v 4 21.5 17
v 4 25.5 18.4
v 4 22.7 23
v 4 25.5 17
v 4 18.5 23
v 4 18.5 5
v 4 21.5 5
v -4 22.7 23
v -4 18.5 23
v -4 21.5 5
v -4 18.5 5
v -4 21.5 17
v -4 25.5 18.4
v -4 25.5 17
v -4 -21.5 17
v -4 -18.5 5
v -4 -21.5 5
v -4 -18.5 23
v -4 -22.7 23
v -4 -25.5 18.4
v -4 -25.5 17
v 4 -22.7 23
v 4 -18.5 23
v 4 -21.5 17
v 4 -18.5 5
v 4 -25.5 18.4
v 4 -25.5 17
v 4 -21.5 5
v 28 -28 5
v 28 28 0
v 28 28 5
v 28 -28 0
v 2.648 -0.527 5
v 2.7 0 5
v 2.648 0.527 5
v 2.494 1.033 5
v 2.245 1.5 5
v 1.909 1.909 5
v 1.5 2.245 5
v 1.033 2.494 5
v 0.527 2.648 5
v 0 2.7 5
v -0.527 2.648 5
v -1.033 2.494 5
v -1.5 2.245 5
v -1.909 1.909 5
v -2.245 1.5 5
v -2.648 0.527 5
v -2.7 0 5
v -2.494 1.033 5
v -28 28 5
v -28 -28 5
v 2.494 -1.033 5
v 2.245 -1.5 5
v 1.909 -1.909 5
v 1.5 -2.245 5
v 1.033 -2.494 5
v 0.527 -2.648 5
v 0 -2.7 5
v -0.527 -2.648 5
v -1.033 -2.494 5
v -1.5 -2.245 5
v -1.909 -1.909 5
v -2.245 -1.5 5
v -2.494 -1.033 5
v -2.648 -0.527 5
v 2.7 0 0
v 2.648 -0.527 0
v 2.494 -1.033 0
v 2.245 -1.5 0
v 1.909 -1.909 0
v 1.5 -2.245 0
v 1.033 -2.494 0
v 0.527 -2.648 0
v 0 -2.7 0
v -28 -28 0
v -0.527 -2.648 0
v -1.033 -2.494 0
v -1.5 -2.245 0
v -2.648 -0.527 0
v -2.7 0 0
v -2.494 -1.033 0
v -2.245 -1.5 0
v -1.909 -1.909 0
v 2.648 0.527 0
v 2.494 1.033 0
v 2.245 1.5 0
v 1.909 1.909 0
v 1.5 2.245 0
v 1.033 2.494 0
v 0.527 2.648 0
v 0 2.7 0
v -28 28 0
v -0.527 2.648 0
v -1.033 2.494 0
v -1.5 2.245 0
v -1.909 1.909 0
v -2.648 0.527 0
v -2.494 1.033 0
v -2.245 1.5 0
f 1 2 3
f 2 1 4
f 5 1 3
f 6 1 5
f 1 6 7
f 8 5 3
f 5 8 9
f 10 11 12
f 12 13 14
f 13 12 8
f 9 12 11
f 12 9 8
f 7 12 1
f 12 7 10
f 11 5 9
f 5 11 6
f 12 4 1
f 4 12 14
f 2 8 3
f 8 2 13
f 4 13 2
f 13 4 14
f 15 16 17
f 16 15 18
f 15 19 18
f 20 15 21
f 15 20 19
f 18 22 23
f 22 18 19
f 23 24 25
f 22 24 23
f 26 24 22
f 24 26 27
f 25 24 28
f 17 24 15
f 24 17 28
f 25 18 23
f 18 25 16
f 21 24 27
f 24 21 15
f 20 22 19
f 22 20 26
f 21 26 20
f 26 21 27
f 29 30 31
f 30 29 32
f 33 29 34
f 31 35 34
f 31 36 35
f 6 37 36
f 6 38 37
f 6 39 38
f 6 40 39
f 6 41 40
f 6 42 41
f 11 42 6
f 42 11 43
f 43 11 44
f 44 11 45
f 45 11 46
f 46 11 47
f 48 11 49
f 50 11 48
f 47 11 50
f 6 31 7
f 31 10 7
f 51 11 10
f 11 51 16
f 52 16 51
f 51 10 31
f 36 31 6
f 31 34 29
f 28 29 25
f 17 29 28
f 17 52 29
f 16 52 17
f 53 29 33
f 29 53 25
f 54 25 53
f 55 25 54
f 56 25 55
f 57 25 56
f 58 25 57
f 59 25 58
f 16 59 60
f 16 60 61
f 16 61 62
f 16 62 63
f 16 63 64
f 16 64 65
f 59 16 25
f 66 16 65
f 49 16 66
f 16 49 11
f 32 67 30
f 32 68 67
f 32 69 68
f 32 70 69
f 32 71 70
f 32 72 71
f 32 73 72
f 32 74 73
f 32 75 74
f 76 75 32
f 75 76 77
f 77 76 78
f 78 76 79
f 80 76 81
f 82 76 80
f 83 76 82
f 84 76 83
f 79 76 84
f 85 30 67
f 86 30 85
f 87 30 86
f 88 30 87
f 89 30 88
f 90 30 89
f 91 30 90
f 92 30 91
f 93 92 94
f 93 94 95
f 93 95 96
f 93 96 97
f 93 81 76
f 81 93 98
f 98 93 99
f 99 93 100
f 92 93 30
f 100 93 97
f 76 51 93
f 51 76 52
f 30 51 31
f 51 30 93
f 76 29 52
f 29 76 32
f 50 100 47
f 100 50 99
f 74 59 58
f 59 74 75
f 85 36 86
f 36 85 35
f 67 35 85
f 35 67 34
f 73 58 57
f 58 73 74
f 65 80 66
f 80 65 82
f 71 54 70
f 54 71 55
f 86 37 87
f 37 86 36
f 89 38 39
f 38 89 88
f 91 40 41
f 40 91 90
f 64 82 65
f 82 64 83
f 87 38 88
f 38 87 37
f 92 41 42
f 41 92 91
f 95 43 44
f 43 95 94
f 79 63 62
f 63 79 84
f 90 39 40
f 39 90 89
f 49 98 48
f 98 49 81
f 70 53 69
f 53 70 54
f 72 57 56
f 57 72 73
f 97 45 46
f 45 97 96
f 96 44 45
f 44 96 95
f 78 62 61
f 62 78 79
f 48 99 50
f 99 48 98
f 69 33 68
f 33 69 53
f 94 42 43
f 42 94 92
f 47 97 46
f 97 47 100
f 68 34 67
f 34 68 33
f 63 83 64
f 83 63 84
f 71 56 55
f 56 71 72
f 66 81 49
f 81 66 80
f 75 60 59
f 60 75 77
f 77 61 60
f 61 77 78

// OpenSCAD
$fn = 32;

// ----------------------------------------------------------------------
// Snap-fit latch: 2 arms, 18 mm tall, 4.2 mm undercut hooks
// ----------------------------------------------------------------------

// --- parameters (mm) ---
base_d = 56;              // base plate depth
base_h = 5;               // base plate thickness
span = 40;                // distance between opposite arms
arm_t = 3;                // arm thickness
arm_d = 8;                // arm width
height = 18;              // free arm length
head_len = 4.2;           // hook reach
head_h = 6;               // hook height
lead = 1.4;               // lead-in ramp thickness
bore_d = 5.4;             // base fixing bore
top_z = 23;               // height of the arm tips above the base

arms = 2;

difference() {
  union() {
    /* base plate, centred on the arm ring */
    translate([-28, -28, 0]) cube([base_d, base_d, base_h]);
    for (a = [0 : 360 / arms : 359]) rotate([0, 0, a]) {
    /* arm, sunk 0.5 mm into the base */
    translate([-arm_d / 2, span / 2 - arm_t / 2, base_h - 0.5]) cube([arm_d, arm_t, height + 0.5]);
    /* hook: a convex hull of a tall inner block and a thin outer lip
       gives a flat undercut below and a lead-in ramp on top */
    hull() {
      translate([-arm_d / 2, span / 2 + arm_t / 2 - 0.6, top_z - head_h]) cube([arm_d, lead + 0.4, head_h]);
      translate([-arm_d / 2, span / 2 + arm_t / 2 - 0.2, top_z - head_h]) cube([arm_d, head_len, lead]);
    }
    }
  }
  translate([0, 0, -2.5]) cylinder(h = base_h + 5, d = bore_d);
}
